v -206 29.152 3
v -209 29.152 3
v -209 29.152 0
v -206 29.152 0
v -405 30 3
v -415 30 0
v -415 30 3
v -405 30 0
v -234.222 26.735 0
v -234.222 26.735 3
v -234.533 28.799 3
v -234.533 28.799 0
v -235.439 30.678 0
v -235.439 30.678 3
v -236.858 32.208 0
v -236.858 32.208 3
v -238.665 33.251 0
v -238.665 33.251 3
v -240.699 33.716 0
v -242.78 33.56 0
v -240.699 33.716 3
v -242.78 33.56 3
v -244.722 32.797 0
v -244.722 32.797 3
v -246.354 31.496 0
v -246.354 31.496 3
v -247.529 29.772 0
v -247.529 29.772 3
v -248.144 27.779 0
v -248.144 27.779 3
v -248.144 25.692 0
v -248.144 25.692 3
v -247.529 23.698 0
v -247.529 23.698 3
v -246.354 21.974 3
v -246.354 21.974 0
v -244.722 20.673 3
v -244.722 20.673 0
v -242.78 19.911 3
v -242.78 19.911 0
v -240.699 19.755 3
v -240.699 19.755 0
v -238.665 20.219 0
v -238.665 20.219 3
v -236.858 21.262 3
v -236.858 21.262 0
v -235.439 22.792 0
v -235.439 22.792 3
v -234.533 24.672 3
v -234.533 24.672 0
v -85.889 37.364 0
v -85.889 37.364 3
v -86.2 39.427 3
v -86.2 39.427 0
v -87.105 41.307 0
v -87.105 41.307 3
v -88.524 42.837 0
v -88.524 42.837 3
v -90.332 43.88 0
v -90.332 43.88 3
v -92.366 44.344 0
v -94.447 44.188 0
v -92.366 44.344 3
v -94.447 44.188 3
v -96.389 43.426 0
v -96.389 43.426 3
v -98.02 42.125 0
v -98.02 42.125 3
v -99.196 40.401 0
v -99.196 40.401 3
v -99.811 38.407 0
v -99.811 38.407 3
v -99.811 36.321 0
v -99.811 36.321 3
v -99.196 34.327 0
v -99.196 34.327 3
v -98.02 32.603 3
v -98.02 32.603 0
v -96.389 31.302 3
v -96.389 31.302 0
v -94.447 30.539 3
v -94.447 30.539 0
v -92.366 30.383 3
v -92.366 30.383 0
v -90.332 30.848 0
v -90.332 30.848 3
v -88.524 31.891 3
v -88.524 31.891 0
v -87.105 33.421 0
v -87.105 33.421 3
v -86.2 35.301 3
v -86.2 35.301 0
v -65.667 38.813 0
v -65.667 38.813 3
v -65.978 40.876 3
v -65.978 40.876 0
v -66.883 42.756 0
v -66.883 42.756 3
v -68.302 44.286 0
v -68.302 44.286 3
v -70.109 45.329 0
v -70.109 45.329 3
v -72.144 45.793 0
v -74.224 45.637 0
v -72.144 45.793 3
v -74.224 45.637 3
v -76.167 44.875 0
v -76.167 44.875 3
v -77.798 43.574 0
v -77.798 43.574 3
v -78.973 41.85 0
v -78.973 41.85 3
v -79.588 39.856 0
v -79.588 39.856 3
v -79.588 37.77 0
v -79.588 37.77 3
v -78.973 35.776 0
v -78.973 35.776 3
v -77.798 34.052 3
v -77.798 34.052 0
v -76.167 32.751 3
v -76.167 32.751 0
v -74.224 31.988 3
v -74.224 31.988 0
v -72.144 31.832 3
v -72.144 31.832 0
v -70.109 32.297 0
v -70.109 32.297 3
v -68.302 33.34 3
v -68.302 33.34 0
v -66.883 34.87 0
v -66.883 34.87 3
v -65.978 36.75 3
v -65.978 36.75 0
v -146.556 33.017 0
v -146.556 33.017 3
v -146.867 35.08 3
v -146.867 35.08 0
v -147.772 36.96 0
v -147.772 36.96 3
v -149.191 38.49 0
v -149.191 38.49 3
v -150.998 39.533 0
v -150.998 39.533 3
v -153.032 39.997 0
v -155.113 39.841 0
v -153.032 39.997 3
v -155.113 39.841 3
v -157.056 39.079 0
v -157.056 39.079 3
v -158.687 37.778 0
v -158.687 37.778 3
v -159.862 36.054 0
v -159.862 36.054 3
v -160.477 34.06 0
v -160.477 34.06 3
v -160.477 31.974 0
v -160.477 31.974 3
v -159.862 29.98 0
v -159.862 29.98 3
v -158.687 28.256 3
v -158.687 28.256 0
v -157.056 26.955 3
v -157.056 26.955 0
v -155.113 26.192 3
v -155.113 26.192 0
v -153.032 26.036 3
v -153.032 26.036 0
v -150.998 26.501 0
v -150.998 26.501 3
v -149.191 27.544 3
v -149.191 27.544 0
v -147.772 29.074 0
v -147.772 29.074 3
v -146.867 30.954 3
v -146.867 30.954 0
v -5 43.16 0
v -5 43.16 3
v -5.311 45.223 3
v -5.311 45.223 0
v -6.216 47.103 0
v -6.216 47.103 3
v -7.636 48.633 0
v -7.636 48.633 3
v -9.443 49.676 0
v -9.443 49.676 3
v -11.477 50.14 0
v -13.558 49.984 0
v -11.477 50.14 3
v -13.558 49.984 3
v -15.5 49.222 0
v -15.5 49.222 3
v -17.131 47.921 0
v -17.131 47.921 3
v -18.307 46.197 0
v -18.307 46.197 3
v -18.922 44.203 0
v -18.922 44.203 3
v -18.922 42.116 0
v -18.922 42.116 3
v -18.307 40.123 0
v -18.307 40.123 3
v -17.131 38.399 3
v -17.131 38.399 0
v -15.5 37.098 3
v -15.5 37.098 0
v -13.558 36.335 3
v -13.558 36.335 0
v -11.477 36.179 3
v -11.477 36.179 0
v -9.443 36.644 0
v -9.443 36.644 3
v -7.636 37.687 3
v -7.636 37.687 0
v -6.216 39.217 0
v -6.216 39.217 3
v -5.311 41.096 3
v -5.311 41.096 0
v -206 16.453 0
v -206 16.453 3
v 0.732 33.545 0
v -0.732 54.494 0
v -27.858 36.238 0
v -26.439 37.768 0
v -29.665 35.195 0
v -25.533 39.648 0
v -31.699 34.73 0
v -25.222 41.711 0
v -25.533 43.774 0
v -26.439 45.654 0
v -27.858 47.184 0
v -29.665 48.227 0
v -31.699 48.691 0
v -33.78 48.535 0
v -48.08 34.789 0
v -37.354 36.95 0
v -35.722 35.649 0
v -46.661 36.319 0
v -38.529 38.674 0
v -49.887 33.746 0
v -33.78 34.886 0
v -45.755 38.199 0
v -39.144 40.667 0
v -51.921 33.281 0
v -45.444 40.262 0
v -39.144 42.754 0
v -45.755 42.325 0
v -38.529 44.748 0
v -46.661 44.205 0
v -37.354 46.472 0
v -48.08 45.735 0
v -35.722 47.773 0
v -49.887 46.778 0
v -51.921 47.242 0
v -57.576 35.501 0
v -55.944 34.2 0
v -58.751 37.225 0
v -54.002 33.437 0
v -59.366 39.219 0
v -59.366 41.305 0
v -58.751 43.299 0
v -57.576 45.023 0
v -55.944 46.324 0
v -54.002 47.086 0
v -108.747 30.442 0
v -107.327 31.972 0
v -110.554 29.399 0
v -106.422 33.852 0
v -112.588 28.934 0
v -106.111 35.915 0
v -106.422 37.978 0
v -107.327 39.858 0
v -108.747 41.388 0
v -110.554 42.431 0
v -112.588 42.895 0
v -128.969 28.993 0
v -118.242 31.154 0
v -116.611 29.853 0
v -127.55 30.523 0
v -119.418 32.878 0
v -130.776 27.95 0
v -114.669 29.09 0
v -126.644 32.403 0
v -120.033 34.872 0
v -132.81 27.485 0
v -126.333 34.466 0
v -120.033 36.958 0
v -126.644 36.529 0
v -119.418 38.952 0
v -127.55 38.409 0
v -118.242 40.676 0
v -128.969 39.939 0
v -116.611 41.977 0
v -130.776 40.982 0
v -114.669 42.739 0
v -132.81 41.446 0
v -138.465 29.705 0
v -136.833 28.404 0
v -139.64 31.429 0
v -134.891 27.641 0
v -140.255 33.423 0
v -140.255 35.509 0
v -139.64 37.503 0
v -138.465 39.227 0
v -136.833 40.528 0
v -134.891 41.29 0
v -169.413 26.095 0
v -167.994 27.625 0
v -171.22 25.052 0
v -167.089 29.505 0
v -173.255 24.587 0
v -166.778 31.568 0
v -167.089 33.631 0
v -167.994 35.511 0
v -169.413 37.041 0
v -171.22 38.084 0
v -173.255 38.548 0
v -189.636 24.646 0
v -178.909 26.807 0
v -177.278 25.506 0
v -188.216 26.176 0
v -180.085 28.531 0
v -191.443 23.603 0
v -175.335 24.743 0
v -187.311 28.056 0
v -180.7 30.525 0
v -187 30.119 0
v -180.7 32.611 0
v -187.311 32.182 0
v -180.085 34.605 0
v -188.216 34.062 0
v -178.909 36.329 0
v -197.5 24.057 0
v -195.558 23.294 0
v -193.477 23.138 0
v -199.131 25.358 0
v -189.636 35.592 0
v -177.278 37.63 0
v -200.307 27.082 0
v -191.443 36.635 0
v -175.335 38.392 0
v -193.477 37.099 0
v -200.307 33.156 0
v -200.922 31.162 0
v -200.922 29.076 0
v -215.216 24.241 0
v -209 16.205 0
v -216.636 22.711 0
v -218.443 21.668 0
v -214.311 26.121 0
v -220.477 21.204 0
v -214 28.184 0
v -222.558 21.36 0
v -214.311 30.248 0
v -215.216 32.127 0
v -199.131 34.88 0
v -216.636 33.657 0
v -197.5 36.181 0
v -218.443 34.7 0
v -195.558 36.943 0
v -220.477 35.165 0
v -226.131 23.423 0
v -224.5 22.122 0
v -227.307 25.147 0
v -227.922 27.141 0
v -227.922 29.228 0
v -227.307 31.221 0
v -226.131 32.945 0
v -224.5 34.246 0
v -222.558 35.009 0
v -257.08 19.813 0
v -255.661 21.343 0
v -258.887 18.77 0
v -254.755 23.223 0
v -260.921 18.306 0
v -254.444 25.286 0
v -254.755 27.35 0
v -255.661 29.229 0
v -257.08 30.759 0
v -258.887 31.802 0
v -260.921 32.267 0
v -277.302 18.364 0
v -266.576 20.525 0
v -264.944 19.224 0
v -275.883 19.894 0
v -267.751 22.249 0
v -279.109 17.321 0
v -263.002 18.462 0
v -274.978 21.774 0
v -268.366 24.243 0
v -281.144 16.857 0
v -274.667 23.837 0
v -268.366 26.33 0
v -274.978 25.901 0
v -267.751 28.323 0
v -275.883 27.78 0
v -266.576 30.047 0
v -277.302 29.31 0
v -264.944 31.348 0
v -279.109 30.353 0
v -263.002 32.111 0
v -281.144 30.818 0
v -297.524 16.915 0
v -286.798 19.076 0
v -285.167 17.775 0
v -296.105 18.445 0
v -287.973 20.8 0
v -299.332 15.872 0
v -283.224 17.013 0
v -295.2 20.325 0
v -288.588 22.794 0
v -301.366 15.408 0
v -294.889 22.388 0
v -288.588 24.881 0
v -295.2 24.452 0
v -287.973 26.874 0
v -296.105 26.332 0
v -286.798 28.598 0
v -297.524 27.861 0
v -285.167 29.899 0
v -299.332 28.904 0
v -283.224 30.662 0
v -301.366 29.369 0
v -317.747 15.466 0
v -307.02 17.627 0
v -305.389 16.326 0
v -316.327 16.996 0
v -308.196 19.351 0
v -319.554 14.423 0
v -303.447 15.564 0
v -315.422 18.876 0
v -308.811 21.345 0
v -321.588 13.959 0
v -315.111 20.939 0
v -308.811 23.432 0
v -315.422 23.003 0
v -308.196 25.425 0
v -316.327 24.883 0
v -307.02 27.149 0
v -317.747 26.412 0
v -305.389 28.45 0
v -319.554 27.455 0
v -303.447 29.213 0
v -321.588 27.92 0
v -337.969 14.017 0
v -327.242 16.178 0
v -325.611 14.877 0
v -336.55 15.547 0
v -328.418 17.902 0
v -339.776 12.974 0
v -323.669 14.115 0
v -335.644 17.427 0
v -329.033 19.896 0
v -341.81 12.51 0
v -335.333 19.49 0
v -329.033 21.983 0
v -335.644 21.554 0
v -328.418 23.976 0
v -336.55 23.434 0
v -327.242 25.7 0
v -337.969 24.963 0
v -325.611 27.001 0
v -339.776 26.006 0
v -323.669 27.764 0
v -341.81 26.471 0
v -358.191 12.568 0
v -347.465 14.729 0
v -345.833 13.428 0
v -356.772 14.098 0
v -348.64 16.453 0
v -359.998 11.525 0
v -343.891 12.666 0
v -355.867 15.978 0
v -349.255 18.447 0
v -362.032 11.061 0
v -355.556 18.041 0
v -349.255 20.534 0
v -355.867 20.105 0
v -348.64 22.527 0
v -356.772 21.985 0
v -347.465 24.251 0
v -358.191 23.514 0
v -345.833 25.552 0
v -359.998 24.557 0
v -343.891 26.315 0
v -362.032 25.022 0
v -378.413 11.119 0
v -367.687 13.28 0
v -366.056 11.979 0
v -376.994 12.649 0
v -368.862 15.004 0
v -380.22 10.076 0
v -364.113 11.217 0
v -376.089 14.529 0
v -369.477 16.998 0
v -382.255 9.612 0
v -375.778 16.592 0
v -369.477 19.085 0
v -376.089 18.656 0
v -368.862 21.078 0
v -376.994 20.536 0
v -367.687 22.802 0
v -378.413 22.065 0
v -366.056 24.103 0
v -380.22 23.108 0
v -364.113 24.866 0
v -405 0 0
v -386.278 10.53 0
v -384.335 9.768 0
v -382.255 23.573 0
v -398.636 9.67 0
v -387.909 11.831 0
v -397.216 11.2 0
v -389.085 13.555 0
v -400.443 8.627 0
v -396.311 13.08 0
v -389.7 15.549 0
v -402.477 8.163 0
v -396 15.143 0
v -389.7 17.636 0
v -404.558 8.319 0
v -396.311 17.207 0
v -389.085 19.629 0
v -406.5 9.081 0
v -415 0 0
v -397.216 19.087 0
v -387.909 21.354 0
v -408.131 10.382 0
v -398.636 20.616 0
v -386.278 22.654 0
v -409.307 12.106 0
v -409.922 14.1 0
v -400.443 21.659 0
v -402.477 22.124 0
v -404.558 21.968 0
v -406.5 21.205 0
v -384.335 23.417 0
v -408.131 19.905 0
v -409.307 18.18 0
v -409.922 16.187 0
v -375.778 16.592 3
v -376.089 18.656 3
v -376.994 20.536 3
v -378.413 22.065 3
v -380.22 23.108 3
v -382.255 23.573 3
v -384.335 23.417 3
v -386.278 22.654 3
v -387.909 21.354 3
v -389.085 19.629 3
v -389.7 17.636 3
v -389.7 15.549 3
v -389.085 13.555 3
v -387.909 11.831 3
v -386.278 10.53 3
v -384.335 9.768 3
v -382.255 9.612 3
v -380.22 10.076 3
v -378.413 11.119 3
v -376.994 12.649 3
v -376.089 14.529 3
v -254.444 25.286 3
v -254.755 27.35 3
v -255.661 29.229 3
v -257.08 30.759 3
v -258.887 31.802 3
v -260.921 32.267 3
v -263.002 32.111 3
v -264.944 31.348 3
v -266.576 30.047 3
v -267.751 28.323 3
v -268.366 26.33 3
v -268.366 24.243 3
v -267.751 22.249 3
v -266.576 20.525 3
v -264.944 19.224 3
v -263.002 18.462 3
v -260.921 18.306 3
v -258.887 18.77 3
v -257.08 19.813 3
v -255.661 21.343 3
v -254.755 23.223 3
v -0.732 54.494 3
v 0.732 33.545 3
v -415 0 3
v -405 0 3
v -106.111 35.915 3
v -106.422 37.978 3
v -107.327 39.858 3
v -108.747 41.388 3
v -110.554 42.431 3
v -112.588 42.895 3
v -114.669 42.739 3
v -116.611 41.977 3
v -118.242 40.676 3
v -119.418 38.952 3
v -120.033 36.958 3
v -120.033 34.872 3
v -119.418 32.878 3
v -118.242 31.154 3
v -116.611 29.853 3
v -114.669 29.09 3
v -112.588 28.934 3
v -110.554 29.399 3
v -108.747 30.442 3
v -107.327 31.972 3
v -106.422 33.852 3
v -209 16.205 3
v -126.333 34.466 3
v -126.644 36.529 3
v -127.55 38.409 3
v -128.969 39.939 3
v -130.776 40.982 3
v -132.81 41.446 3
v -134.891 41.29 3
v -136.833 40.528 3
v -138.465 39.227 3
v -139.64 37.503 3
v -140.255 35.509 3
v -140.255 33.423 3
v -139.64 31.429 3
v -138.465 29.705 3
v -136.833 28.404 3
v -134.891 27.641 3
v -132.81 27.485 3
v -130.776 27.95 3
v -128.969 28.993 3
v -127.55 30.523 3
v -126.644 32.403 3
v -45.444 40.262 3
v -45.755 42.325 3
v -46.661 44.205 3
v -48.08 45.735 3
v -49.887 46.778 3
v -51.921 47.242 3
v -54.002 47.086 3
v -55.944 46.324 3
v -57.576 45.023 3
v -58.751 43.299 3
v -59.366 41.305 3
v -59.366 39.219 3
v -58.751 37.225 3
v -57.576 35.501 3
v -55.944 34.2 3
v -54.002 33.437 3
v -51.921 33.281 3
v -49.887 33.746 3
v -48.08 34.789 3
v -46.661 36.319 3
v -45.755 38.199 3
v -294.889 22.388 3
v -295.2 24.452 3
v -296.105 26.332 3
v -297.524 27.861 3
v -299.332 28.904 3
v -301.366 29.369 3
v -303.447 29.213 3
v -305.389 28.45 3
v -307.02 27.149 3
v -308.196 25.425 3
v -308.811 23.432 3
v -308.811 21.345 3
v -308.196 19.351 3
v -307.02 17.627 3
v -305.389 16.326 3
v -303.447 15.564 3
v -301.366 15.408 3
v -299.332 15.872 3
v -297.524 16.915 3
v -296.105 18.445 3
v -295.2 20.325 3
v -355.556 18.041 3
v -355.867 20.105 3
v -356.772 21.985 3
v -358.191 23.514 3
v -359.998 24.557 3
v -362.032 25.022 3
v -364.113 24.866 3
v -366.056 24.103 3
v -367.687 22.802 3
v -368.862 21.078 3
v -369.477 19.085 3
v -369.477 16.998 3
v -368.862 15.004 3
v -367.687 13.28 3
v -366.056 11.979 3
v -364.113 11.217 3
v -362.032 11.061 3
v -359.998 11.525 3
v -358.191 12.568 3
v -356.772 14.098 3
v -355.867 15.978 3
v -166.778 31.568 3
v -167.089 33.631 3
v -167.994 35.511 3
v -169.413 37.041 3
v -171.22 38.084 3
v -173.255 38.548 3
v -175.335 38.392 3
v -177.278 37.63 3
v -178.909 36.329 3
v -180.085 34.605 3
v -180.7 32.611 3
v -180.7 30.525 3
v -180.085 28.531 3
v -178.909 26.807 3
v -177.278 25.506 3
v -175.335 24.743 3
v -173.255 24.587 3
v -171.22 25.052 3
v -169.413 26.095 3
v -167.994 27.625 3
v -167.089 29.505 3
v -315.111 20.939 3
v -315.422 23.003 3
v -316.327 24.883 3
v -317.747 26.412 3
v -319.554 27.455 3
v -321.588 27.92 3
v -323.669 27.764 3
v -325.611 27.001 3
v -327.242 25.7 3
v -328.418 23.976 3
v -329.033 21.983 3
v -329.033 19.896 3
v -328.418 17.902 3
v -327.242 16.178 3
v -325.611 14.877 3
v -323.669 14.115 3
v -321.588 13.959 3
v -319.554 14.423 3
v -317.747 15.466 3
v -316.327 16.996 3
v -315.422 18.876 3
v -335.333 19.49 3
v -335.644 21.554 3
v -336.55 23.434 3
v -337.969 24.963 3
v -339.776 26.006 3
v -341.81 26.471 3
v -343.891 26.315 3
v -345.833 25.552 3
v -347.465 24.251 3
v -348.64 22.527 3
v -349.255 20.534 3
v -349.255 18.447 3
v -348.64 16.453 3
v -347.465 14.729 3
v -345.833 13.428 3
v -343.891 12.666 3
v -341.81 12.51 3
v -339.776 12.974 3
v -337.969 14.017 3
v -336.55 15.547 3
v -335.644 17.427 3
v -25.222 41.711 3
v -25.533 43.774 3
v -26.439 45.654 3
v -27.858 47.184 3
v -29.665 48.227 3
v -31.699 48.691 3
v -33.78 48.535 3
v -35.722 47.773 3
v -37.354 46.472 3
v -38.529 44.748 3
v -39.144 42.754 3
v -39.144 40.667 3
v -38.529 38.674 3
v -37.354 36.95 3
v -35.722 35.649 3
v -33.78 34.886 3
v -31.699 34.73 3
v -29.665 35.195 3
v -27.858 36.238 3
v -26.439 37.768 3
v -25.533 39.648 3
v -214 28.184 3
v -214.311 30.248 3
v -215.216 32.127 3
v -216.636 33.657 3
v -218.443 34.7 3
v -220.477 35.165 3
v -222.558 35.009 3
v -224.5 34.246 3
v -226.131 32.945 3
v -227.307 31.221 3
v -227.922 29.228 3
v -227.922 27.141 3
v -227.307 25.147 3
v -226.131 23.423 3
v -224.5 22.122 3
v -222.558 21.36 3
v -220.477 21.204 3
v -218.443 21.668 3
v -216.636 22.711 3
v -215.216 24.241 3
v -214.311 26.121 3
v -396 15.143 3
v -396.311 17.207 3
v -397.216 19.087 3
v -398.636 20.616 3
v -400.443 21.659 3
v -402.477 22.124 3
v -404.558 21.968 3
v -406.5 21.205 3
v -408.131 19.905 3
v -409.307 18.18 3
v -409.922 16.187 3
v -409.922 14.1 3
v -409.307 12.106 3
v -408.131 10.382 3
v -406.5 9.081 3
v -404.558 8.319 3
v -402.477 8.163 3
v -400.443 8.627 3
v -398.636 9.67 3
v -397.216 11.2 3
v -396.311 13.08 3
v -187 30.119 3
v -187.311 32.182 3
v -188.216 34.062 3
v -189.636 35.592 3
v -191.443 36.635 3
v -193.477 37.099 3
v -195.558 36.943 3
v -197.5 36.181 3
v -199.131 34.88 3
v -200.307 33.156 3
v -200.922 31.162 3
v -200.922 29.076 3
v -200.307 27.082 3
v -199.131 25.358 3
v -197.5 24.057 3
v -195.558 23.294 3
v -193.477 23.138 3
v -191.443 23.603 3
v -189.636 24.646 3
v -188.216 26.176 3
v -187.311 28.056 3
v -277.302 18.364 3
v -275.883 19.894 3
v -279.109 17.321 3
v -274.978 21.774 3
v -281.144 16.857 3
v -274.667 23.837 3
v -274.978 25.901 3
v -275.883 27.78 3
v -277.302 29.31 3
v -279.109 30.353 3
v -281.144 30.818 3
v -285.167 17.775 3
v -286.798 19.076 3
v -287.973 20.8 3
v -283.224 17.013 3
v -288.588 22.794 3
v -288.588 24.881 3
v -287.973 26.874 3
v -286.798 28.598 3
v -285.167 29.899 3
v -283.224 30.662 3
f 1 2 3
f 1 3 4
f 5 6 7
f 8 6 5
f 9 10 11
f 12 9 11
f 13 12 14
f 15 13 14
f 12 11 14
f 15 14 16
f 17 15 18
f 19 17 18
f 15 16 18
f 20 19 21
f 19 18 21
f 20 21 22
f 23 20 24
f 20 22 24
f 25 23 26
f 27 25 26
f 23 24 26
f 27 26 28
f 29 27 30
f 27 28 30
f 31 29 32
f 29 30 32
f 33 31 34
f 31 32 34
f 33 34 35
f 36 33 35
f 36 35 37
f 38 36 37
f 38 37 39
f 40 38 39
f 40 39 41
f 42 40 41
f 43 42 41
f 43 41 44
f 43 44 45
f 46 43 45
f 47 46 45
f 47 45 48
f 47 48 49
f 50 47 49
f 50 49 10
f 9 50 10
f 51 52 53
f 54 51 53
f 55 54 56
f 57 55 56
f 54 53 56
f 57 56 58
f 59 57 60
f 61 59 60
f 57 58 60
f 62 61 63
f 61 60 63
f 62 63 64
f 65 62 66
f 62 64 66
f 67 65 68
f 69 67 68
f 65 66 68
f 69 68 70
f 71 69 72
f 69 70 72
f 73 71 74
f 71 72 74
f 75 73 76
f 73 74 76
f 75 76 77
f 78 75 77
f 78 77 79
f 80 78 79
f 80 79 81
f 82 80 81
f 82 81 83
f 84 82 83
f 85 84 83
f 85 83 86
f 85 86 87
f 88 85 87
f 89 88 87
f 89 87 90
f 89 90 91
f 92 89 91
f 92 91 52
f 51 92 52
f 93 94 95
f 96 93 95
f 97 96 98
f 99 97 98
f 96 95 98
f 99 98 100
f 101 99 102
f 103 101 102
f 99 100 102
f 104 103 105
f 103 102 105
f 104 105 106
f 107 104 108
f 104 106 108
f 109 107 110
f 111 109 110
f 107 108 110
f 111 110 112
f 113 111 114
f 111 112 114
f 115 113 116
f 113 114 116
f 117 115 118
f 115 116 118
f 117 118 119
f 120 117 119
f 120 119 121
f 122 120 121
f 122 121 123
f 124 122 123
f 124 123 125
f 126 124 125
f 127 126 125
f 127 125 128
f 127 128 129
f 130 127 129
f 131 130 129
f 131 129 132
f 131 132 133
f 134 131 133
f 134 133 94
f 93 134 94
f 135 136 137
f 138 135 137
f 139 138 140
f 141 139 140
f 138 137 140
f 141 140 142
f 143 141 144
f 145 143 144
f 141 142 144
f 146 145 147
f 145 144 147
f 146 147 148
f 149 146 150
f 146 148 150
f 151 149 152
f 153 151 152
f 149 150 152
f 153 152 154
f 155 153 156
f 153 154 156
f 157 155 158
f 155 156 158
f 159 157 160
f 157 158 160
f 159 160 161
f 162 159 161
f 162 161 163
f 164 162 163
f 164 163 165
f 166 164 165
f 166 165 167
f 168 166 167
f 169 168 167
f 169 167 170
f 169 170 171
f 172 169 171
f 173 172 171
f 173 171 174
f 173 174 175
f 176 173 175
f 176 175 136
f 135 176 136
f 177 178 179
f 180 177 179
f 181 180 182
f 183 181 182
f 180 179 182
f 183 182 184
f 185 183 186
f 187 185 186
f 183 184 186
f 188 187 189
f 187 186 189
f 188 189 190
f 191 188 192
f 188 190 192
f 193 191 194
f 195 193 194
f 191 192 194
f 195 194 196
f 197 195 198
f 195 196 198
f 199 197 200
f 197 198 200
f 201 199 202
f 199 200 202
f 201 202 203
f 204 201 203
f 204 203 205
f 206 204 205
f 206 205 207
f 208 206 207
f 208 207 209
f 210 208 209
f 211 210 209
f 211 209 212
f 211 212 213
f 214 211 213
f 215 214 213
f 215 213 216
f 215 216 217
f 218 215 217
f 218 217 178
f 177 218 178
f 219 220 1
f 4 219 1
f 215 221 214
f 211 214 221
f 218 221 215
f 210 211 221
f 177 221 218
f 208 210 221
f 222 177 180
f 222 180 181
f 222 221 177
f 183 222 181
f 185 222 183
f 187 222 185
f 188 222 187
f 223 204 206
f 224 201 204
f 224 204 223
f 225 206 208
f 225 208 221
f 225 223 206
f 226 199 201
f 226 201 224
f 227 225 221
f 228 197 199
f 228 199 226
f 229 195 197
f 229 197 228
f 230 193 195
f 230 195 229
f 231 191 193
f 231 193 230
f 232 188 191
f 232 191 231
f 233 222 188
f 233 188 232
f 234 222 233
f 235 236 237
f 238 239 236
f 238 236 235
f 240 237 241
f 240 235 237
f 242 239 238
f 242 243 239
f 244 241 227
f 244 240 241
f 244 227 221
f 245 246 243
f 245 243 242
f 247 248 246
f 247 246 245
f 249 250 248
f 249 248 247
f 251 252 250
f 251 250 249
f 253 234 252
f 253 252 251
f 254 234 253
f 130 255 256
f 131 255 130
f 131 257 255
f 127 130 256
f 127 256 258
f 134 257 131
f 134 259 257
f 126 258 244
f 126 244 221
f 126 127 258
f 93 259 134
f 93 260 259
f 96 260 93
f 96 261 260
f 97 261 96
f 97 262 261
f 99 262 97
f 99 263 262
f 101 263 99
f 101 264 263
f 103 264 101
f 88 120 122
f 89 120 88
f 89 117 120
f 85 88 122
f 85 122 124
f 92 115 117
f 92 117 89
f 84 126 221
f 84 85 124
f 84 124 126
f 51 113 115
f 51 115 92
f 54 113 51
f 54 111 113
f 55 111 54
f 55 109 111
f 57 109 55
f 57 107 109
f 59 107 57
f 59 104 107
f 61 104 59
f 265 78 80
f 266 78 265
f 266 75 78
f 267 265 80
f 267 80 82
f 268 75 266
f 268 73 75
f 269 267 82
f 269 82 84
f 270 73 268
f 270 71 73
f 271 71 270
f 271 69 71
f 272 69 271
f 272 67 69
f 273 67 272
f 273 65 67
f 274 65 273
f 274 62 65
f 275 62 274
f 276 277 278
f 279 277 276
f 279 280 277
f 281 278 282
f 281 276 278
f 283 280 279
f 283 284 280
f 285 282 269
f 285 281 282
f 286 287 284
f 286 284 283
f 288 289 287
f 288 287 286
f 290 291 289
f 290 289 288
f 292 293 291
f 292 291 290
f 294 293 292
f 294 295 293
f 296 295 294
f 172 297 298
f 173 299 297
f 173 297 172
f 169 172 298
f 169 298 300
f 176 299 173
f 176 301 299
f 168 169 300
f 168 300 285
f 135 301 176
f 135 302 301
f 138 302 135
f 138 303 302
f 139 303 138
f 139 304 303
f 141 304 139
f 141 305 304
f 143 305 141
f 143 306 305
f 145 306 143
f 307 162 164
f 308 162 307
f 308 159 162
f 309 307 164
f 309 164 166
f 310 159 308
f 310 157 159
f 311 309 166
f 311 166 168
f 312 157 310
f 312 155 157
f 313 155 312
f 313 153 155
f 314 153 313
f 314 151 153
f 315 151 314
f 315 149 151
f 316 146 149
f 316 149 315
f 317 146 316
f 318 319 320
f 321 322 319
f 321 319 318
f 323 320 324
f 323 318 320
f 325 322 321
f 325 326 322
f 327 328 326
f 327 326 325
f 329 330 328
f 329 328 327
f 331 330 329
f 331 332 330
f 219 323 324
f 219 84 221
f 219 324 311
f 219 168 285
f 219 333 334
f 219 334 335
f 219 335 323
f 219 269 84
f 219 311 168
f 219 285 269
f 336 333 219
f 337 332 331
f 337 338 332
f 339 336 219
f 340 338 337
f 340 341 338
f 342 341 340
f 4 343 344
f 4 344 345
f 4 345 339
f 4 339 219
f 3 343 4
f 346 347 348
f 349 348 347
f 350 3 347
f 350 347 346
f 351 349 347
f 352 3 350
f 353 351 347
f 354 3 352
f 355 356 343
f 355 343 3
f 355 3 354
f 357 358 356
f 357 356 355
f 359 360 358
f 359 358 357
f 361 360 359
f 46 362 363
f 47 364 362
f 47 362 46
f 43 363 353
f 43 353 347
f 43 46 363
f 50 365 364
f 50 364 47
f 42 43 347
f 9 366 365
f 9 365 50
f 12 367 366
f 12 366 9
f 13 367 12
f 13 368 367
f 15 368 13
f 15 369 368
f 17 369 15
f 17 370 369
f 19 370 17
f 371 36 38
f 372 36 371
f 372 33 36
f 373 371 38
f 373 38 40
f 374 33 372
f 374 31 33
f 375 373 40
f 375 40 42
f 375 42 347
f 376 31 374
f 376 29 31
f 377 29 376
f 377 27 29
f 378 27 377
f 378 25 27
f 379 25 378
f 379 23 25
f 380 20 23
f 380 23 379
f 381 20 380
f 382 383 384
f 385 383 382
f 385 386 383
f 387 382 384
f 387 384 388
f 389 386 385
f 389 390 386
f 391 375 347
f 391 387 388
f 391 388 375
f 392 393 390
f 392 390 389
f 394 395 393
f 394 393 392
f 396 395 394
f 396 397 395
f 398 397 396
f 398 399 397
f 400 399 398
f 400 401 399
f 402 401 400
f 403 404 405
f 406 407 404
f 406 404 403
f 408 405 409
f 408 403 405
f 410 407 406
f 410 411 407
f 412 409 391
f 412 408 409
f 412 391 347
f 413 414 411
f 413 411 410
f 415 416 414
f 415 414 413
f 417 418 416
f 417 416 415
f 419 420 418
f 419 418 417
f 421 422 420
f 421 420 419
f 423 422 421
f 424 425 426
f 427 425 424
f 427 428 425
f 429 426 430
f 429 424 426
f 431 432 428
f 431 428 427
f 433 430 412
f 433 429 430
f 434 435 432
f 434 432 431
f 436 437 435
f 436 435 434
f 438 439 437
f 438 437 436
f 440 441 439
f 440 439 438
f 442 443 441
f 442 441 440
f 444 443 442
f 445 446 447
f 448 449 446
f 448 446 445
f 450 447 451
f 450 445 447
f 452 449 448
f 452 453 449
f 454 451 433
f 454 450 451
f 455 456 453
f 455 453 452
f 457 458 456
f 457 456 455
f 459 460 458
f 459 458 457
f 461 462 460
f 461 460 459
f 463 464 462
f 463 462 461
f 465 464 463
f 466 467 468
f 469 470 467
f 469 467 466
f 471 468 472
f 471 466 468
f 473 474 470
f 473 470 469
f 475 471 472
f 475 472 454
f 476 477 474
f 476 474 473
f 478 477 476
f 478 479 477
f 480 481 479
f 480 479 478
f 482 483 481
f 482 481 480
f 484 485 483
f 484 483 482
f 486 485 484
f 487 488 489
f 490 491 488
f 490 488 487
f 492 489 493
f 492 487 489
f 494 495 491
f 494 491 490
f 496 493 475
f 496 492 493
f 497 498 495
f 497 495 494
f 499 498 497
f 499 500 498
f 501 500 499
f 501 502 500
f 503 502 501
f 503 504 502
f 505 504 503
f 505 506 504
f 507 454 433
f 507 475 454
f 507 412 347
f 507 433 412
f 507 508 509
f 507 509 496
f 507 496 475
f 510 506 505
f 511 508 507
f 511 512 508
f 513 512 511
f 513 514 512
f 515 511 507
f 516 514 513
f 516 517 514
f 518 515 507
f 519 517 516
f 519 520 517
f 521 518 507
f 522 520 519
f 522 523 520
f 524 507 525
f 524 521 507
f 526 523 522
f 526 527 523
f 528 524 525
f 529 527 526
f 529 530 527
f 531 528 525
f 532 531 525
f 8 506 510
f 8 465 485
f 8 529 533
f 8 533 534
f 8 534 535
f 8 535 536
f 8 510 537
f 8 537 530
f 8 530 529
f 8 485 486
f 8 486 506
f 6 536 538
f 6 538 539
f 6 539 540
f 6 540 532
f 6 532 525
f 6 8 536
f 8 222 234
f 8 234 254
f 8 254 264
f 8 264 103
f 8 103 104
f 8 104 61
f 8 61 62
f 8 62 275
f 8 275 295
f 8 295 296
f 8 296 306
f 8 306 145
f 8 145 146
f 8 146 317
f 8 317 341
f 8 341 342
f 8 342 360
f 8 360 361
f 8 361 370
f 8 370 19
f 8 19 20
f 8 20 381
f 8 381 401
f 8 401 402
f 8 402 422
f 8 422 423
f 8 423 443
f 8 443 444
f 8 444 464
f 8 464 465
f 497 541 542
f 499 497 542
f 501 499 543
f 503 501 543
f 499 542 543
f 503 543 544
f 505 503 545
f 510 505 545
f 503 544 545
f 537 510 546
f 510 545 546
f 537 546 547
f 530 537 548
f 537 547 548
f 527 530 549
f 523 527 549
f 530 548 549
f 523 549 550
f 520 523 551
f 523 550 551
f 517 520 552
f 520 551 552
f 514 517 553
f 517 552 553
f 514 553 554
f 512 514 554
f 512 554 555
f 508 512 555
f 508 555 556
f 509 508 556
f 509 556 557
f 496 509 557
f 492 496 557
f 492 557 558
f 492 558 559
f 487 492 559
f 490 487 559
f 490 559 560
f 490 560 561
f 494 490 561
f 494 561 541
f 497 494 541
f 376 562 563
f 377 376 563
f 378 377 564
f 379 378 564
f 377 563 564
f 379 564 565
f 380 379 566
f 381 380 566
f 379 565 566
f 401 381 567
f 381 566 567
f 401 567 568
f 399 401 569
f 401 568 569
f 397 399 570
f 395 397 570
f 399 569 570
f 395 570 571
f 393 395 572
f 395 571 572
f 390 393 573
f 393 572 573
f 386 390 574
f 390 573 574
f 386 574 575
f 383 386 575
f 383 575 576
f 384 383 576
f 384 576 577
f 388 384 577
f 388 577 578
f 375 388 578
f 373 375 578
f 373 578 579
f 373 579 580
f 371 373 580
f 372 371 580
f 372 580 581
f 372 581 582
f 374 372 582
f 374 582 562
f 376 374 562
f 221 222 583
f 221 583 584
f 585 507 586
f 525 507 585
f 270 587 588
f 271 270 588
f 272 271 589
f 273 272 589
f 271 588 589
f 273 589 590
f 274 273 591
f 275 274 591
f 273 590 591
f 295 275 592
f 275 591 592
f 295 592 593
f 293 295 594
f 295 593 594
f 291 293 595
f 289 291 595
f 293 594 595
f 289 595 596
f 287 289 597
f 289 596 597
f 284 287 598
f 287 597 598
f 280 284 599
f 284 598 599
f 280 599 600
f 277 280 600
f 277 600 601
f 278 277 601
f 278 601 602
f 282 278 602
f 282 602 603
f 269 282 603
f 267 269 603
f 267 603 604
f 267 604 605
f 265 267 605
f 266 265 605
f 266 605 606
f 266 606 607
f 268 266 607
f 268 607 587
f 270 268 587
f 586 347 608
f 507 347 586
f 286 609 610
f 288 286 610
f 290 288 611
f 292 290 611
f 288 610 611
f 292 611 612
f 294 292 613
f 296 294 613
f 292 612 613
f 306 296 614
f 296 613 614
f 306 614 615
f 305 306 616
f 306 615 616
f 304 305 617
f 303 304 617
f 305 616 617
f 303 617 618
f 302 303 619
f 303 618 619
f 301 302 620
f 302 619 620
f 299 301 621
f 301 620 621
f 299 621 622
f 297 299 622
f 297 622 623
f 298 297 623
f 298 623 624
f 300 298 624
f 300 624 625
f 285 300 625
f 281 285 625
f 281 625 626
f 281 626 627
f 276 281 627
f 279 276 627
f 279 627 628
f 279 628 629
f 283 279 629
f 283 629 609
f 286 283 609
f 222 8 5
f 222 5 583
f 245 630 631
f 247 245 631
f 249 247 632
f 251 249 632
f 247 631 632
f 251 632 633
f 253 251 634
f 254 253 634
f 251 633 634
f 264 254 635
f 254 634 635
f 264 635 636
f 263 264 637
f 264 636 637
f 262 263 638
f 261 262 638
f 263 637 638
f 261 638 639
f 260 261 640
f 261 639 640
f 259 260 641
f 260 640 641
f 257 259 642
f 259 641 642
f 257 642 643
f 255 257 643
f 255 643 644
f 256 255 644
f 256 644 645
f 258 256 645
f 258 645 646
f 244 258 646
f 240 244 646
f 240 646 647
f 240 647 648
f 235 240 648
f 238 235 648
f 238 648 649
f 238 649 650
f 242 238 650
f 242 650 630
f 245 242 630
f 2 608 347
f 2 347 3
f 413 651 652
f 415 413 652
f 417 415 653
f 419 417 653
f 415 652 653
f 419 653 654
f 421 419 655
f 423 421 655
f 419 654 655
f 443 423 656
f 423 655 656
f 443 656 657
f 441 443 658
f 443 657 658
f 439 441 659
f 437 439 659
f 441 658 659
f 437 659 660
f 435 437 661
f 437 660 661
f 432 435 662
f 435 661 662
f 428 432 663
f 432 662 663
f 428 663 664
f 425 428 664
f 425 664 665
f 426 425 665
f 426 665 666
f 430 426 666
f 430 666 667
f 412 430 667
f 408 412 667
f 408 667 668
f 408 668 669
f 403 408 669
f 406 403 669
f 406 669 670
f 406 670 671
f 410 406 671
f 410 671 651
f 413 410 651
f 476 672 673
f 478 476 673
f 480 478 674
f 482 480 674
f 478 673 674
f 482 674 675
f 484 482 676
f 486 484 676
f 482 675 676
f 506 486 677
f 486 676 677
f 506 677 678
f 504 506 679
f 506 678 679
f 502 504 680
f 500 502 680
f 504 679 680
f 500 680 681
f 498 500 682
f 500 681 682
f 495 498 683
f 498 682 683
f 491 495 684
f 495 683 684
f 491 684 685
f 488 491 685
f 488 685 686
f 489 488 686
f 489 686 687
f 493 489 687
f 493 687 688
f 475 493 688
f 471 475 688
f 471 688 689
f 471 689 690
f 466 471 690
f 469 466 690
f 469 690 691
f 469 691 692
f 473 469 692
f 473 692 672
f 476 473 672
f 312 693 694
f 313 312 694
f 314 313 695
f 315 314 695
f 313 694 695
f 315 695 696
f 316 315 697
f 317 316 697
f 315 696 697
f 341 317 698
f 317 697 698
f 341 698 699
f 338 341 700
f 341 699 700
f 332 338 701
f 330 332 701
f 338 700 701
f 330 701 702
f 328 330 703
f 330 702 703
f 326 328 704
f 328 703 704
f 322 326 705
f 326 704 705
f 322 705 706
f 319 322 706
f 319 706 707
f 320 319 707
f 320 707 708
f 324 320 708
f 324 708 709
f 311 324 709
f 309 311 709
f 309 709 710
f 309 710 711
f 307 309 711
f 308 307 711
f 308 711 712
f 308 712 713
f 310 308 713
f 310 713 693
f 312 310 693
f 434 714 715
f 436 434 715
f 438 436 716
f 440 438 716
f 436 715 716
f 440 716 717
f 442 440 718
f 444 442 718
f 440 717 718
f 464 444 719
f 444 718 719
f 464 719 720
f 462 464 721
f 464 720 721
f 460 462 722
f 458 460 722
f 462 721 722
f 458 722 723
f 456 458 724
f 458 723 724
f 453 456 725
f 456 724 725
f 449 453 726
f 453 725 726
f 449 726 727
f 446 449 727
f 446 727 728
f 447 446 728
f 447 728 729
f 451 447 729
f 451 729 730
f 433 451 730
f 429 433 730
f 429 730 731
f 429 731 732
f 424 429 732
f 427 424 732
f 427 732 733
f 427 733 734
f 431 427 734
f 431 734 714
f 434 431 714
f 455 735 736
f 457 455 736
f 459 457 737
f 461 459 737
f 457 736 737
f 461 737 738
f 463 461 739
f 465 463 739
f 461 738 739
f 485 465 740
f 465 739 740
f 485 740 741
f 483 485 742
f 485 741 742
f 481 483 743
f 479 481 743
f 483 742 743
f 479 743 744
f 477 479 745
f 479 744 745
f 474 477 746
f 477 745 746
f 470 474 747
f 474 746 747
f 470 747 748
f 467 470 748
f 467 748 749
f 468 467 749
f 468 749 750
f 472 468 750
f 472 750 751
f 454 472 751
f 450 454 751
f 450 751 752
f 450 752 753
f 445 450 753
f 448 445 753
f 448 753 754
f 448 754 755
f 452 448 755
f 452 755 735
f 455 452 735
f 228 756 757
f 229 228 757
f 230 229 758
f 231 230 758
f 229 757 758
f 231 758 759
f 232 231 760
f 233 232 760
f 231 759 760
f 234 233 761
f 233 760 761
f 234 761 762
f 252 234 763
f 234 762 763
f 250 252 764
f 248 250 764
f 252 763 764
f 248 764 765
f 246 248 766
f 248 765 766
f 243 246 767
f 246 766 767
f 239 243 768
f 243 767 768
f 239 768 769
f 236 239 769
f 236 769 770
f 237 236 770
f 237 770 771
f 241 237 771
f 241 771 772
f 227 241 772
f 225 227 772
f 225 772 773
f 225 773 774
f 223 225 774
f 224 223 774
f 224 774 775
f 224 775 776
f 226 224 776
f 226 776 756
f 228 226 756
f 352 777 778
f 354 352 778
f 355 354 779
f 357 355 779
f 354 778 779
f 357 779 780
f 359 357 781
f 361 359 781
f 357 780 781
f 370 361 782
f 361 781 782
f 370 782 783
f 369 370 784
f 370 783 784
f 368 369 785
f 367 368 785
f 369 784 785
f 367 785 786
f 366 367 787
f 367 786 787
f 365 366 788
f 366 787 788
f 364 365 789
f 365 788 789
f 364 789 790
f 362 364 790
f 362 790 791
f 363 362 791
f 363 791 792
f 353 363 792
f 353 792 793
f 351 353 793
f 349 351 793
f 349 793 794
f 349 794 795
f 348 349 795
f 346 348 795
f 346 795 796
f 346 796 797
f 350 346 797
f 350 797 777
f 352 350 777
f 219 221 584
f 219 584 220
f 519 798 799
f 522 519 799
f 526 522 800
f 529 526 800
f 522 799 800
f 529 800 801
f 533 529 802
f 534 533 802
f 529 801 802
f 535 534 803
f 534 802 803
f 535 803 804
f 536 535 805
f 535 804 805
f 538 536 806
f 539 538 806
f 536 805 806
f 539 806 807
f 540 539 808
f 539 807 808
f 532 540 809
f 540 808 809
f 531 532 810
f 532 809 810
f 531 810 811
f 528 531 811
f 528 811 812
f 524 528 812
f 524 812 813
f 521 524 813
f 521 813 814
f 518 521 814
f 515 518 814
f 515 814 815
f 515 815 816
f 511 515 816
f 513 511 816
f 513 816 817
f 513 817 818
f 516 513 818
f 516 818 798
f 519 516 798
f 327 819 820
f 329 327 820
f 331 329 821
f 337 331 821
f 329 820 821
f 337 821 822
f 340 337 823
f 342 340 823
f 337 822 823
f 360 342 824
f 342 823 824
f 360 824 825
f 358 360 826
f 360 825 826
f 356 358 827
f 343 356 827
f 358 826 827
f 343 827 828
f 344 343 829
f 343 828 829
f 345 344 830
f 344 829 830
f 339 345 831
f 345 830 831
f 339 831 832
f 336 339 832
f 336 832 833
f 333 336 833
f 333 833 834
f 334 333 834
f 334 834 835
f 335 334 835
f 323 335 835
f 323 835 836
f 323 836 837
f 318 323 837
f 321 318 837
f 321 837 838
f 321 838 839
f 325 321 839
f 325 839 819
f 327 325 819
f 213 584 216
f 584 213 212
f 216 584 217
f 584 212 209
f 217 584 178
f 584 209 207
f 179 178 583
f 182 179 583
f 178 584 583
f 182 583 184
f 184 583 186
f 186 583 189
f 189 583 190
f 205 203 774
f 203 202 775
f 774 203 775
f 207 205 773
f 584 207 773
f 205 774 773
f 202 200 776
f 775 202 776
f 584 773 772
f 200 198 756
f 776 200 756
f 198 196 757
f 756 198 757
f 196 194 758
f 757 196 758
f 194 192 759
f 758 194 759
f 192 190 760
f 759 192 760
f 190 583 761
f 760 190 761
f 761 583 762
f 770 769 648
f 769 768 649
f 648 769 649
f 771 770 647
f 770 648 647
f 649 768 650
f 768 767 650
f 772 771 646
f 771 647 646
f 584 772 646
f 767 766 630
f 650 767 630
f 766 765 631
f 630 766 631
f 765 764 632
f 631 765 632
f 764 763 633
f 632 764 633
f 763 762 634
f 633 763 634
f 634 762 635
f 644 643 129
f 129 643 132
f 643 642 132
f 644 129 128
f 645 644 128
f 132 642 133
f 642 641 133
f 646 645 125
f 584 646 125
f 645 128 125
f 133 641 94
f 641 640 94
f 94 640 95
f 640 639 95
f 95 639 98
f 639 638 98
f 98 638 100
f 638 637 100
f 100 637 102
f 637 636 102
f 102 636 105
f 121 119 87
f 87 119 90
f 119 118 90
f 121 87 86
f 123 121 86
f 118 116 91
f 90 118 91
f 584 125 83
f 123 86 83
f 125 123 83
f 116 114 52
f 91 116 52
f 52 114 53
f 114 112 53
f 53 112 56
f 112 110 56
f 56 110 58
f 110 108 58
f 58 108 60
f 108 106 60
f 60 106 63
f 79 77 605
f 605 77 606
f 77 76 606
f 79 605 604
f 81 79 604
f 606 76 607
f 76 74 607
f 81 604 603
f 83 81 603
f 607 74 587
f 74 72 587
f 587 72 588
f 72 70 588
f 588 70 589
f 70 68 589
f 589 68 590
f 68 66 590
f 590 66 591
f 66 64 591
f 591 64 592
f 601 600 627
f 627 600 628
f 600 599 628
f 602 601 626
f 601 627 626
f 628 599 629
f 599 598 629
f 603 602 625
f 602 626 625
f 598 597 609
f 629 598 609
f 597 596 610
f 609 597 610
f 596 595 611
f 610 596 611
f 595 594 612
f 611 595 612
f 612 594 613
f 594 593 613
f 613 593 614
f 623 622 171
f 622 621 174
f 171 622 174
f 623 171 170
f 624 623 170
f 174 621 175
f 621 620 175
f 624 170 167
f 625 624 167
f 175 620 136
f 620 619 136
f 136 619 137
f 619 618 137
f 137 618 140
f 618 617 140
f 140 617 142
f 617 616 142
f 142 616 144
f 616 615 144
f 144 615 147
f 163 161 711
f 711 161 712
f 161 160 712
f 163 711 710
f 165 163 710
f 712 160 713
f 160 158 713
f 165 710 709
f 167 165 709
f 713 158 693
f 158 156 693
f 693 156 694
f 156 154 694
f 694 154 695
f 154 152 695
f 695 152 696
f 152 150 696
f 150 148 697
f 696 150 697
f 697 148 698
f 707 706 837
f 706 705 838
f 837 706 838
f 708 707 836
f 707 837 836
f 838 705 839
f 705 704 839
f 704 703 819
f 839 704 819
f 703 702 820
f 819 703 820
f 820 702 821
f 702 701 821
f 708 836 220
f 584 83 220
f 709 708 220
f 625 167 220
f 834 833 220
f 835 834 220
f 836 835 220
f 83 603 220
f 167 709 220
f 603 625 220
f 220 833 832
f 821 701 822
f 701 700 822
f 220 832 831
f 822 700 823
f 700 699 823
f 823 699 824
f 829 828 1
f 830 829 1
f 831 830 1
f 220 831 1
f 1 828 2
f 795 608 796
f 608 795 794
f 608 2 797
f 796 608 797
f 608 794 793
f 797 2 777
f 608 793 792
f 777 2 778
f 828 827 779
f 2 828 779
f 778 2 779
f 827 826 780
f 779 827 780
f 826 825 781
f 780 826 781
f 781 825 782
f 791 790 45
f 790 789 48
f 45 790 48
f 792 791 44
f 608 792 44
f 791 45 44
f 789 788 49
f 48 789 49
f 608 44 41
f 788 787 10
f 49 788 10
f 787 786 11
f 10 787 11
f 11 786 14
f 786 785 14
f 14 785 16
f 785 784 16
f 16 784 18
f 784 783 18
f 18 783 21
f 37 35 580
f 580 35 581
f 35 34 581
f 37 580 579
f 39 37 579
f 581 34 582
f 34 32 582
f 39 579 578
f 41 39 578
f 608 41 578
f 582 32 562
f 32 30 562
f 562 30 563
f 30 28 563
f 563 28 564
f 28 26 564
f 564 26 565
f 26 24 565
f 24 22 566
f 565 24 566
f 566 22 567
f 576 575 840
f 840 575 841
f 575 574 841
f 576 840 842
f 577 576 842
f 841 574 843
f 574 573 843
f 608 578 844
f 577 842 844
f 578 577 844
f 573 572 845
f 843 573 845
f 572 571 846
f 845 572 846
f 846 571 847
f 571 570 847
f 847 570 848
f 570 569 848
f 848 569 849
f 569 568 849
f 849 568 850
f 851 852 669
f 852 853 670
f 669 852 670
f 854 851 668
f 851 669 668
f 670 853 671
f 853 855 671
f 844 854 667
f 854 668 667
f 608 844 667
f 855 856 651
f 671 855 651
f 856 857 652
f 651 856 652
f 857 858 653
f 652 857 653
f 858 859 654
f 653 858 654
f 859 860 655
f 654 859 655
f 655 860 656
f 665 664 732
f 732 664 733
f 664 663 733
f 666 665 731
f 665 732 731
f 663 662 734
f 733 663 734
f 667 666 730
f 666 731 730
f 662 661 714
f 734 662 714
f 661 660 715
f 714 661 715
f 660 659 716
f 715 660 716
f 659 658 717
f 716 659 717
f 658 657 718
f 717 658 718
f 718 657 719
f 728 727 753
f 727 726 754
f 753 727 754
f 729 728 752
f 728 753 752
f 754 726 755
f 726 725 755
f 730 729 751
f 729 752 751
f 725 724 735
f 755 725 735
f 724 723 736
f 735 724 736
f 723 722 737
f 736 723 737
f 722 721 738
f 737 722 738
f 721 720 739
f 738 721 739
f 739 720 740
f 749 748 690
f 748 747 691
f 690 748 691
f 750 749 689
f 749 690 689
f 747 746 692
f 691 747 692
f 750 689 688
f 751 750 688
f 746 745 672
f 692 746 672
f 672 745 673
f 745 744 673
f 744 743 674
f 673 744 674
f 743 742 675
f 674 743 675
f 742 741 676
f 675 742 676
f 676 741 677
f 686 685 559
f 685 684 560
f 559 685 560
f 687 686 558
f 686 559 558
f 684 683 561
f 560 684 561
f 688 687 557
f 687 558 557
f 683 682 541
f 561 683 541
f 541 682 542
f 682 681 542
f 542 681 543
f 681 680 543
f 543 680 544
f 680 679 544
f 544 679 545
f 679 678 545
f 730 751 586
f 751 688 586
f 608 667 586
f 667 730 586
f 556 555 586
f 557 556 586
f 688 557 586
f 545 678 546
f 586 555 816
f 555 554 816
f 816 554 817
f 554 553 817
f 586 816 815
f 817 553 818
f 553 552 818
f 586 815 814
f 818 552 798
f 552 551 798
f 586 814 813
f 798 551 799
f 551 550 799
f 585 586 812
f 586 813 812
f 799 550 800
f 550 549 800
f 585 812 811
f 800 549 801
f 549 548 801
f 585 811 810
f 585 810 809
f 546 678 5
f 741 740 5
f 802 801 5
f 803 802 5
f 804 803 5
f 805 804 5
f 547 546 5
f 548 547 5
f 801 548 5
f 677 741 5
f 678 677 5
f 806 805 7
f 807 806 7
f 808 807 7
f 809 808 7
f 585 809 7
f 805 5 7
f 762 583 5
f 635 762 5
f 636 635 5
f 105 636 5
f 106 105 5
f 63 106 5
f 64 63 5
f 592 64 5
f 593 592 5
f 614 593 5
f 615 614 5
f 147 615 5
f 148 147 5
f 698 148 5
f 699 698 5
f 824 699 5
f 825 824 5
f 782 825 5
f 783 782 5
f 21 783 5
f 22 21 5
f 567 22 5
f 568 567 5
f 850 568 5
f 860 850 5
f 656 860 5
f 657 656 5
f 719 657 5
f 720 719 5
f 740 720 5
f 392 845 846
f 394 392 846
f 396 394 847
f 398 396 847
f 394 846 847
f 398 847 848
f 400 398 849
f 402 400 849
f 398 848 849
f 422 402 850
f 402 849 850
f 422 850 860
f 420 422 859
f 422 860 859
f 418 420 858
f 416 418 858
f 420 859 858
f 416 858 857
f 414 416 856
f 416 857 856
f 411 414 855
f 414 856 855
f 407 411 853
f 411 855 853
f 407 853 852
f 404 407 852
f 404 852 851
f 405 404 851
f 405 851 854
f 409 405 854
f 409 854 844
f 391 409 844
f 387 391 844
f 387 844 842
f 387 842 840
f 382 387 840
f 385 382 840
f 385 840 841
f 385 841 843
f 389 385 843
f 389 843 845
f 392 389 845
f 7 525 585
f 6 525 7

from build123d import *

# Parameters (mm, degrees)
BOSS_EXTRUDE1_DEPTH     = 3
SKETCH2_R               = 7
SKETCH2_W               = 3
SKETCH2_H               = 12.946630698
CUT_EXTRUDE1_DEPTH      = 1
CUT_EXTRUDE1_DEPTH_BACK = 4


with BuildPart() as part:
    # Sketch1 → Boss-Extrude1 (new body)
    with BuildSketch(Plane.XY):
        Polygon((-415, 0), (-415, 30), (-405, 30), (-0.732442974, 54.494049484), (0.732442974, 33.545204429), (-405, 0), align=None)
    extrude(amount=BOSS_EXTRUDE1_DEPTH)

    # Sketch2 → Cut-Extrude1 (cut, two sides)
    with BuildSketch(Plane.XY.offset(3)) as cut_extrude1_sk:
        with Locations((-403, 15.1433068)):
            Circle(SKETCH2_R)
        with Locations((-382.777777778, 16.592297775)):
            Circle(SKETCH2_R)
        with Locations((-362.555555556, 18.041288751)):
            Circle(SKETCH2_R)
        with Locations((-342.333333333, 19.490279727)):
            Circle(SKETCH2_R)
        with Locations((-322.111111111, 20.939270702)):
            Circle(SKETCH2_R)
        with Locations((-301.888888889, 22.388261678)):
            Circle(SKETCH2_R)
        with Locations((-281.666666667, 23.837252653)):
            Circle(SKETCH2_R)
        with Locations((-261.444444444, 25.286243629)):
            Circle(SKETCH2_R)
        with Locations((-241.222222222, 26.735234605)):
            Circle(SKETCH2_R)
        with Locations((-221, 28.18422558)):
            Circle(SKETCH2_R)
        with Locations((-194, 30.118867377)):
            Circle(SKETCH2_R)
        with Locations((-173.777777778, 31.567858353)):
            Circle(SKETCH2_R)
        with Locations((-153.555555556, 33.016849329)):
            Circle(SKETCH2_R)
        with Locations((-133.333333333, 34.465840304)):
            Circle(SKETCH2_R)
        with Locations((-113.111111111, 35.91483128)):
            Circle(SKETCH2_R)
        with Locations((-92.888888889, 37.363822255)):
            Circle(SKETCH2_R)
        with Locations((-72.666666667, 38.812813231)):
            Circle(SKETCH2_R)
        with Locations((-52.444444444, 40.261804207)):
            Circle(SKETCH2_R)
        with Locations((-32.222222222, 41.710795182)):
            Circle(SKETCH2_R)
        with Locations((-12, 43.159786158)):
            Circle(SKETCH2_R)
        with Locations((-207.5, 22.67823113)):
            Rectangle(SKETCH2_W, SKETCH2_H)
    extrude(amount=CUT_EXTRUDE1_DEPTH, mode=Mode.SUBTRACT)
    extrude(cut_extrude1_sk.sketch, amount=-CUT_EXTRUDE1_DEPTH_BACK, mode=Mode.SUBTRACT)


solid = part.part
